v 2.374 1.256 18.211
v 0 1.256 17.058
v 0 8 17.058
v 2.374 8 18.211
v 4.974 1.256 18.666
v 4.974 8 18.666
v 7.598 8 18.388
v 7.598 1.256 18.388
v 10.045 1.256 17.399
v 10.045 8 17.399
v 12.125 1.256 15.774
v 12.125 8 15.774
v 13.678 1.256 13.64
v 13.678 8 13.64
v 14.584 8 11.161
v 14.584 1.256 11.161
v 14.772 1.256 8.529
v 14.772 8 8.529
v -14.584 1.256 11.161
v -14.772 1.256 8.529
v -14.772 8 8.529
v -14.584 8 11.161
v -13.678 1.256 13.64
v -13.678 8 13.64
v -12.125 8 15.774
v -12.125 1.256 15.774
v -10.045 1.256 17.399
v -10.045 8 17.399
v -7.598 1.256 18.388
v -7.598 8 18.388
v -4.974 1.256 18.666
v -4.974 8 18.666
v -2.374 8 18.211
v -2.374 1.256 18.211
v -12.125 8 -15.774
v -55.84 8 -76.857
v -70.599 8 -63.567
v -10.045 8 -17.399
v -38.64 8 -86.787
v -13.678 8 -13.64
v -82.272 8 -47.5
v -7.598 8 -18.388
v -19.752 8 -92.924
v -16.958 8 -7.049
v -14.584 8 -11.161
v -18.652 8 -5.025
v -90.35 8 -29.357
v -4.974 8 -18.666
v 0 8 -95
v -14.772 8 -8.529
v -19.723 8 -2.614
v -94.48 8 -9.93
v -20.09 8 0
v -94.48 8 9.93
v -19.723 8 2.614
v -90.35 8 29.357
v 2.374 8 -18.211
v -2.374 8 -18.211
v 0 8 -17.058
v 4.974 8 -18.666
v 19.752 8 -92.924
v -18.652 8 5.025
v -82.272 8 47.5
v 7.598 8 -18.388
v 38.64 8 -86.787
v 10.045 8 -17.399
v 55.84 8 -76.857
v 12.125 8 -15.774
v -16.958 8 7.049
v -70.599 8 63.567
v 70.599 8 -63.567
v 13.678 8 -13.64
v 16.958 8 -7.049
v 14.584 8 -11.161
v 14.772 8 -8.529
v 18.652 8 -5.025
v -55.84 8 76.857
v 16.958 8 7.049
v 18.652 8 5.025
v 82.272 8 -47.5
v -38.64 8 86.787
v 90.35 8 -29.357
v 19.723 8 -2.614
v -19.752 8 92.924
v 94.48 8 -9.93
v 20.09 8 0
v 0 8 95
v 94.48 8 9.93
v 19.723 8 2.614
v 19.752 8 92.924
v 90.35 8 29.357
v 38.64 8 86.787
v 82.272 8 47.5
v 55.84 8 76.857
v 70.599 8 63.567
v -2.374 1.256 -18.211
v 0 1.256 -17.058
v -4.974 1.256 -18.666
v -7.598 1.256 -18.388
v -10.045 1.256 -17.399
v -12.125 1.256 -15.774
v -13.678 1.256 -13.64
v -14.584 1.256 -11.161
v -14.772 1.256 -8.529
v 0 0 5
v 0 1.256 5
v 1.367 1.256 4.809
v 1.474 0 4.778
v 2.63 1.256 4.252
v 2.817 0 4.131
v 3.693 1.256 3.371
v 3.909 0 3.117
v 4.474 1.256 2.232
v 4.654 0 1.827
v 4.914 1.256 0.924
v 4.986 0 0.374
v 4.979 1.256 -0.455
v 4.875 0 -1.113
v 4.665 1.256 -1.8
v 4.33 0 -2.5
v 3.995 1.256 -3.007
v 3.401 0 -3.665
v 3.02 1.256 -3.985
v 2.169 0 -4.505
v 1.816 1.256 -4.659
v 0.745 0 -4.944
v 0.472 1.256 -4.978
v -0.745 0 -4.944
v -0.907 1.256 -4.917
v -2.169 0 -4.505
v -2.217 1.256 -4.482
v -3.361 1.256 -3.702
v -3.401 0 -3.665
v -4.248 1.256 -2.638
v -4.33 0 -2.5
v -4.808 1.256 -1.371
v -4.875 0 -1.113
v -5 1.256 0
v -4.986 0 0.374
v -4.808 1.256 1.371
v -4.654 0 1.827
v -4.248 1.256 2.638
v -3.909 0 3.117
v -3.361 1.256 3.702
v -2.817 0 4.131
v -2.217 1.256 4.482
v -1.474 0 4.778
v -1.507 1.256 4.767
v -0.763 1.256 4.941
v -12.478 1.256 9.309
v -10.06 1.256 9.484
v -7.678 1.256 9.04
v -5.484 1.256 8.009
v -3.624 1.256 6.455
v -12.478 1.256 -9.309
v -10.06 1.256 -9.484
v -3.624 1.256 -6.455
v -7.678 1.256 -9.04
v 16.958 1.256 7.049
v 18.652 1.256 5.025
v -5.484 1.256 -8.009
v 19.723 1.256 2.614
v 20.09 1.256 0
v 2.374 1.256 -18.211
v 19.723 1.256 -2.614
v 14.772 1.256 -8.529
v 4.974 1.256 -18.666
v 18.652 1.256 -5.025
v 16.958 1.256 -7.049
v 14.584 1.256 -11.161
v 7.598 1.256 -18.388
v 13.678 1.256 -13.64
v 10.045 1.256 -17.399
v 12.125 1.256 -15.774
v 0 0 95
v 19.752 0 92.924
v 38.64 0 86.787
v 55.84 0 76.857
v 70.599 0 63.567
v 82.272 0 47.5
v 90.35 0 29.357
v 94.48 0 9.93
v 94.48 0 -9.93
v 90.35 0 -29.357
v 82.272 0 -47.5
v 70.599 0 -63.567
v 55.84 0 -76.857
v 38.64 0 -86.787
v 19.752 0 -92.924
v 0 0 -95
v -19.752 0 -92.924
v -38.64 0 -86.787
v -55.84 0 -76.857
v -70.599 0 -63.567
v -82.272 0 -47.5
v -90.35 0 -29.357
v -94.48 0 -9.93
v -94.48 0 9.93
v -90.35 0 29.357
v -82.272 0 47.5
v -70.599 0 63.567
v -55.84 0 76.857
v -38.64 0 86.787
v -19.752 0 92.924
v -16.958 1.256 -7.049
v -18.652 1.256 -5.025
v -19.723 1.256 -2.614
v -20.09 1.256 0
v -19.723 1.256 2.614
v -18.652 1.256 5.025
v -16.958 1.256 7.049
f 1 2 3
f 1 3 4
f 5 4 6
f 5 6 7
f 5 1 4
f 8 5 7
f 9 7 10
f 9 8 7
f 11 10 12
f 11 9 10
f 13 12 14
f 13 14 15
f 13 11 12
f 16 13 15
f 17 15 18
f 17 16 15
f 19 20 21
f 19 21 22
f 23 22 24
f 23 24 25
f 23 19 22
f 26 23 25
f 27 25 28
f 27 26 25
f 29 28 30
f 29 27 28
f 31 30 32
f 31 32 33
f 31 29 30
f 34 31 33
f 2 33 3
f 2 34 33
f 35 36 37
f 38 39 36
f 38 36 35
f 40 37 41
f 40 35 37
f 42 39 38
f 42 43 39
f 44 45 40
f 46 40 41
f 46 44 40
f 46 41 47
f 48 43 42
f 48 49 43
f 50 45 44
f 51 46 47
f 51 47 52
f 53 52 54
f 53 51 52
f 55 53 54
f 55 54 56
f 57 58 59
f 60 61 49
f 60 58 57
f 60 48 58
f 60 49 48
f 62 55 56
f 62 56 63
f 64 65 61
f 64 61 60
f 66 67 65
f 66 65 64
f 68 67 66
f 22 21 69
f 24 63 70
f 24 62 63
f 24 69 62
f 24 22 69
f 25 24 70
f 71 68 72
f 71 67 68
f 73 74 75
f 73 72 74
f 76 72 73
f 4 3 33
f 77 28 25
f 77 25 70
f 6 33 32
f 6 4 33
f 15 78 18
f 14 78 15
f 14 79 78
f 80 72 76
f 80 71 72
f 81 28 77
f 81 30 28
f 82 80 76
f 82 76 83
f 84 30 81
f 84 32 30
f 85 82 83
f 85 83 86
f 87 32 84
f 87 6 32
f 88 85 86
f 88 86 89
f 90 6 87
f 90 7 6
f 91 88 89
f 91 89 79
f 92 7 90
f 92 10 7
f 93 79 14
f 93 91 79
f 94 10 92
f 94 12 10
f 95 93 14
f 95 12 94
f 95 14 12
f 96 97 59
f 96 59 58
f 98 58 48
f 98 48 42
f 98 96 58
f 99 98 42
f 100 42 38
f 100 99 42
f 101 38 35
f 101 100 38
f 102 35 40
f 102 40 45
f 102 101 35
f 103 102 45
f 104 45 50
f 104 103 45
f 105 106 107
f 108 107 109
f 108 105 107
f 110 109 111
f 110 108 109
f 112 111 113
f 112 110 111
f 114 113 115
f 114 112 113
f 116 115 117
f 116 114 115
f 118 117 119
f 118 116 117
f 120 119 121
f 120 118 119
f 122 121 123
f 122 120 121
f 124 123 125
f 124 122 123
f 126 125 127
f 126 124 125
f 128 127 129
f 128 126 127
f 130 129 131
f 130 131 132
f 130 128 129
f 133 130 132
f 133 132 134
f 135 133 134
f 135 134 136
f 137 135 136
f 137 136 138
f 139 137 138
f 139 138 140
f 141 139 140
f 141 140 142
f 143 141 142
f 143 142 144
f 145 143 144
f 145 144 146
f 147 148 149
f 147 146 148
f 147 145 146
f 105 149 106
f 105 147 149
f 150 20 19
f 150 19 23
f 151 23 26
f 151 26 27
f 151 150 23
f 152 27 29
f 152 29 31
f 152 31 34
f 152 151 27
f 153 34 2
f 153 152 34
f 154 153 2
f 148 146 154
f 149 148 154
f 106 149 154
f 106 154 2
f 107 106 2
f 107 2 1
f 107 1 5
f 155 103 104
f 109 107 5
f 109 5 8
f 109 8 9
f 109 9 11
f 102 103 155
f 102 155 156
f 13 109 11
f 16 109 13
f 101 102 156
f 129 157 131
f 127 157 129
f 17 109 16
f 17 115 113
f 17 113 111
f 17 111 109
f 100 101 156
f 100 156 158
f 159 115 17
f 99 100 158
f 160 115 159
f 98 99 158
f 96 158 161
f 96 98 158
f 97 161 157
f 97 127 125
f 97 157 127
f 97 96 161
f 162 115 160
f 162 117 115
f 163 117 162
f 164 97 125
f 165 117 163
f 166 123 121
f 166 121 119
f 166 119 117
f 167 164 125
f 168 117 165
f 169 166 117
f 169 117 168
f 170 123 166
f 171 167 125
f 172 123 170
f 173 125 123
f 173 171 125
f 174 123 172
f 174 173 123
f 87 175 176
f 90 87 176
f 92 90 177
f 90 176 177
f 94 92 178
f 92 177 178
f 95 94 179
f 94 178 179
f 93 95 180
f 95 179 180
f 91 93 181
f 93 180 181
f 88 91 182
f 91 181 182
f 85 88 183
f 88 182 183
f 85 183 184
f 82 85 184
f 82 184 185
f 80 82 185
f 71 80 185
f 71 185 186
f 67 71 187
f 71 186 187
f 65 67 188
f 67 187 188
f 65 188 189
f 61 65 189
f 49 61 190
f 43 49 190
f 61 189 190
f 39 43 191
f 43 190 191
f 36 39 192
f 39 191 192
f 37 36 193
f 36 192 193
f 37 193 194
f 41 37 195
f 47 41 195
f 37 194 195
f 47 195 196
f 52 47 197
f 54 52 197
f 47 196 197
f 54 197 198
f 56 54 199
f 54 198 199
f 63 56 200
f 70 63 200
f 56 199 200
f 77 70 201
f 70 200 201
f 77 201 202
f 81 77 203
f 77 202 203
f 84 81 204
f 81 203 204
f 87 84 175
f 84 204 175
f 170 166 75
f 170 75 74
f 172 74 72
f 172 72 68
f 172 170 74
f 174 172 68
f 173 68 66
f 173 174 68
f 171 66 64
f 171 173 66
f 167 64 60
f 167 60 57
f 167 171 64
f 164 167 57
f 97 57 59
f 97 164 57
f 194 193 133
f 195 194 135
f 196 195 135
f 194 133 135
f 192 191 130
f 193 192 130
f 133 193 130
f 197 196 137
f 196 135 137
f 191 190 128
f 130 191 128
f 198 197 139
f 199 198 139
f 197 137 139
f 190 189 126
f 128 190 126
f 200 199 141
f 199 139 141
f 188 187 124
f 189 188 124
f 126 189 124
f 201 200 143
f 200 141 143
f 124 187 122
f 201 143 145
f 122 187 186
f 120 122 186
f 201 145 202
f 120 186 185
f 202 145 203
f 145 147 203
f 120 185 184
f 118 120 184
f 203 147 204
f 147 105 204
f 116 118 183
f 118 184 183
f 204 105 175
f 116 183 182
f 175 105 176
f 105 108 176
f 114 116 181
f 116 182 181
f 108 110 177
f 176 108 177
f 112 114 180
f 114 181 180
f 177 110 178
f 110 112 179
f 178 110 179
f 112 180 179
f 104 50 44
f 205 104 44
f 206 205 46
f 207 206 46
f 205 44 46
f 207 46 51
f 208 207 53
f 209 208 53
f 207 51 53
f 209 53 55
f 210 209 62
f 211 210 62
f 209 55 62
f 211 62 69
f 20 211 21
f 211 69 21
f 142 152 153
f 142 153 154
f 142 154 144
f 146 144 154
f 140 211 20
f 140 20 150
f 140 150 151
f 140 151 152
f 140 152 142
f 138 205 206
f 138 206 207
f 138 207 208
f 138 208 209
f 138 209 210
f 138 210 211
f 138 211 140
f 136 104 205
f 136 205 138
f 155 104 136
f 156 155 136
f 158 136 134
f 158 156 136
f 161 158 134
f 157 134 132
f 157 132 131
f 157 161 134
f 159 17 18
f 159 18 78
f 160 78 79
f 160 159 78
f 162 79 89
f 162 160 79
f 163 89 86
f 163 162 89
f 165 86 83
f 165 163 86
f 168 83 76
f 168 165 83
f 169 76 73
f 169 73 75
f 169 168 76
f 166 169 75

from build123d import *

# Parameters (mm, degrees)
SKETCH1_R           = 95
BOSS_EXTRUDE1_DEPTH = 8
SKETCH2_R           = 5
CUT_EXTRUDE1_DEPTH  = 135.588261004
SKETCH3_R           = 9.498426828
CUT_EXTRUDE2_DEPTH  = 6.74398575
CIRPATTERN1_COUNT   = 6


with BuildPart() as part:
    # Sketch1 → Boss-Extrude1 (new body)
    with BuildSketch(Plane(origin=(0, 0, 0), x_dir=(1, 0, 0), z_dir=(0, 1, 0))):
        Circle(SKETCH1_R)
    extrude(amount=BOSS_EXTRUDE1_DEPTH)

    # Sketch2 → Cut-Extrude1 (cut, through all)
    with BuildSketch(Plane(origin=(0, 0, 0), x_dir=(1, 0, 0), z_dir=(0, 1, 0))):
        Circle(SKETCH2_R)
    extrude(amount=CUT_EXTRUDE1_DEPTH, mode=Mode.SUBTRACT)

    # Sketch3 → Cut-Extrude2 (cut)
    with BuildSketch(Plane(origin=(0, 8, 0), x_dir=(1, 0, 0), z_dir=(0, 1, 0))):
        with Locations((-10.59166458, 0)):
            Circle(SKETCH3_R)
    cut_extrude2 = extrude(amount=-CUT_EXTRUDE2_DEPTH, mode=Mode.SUBTRACT)

    # CirPattern1: Cut-Extrude2 ×6 about axis
    cirpattern1_axis = Axis((0, 0, 0), (0, 1, 0))
    for i in range(1, CIRPATTERN1_COUNT):
        add(cut_extrude2.rotate(cirpattern1_axis, i * 360 / CIRPATTERN1_COUNT), mode=Mode.SUBTRACT)


solid = part.part
